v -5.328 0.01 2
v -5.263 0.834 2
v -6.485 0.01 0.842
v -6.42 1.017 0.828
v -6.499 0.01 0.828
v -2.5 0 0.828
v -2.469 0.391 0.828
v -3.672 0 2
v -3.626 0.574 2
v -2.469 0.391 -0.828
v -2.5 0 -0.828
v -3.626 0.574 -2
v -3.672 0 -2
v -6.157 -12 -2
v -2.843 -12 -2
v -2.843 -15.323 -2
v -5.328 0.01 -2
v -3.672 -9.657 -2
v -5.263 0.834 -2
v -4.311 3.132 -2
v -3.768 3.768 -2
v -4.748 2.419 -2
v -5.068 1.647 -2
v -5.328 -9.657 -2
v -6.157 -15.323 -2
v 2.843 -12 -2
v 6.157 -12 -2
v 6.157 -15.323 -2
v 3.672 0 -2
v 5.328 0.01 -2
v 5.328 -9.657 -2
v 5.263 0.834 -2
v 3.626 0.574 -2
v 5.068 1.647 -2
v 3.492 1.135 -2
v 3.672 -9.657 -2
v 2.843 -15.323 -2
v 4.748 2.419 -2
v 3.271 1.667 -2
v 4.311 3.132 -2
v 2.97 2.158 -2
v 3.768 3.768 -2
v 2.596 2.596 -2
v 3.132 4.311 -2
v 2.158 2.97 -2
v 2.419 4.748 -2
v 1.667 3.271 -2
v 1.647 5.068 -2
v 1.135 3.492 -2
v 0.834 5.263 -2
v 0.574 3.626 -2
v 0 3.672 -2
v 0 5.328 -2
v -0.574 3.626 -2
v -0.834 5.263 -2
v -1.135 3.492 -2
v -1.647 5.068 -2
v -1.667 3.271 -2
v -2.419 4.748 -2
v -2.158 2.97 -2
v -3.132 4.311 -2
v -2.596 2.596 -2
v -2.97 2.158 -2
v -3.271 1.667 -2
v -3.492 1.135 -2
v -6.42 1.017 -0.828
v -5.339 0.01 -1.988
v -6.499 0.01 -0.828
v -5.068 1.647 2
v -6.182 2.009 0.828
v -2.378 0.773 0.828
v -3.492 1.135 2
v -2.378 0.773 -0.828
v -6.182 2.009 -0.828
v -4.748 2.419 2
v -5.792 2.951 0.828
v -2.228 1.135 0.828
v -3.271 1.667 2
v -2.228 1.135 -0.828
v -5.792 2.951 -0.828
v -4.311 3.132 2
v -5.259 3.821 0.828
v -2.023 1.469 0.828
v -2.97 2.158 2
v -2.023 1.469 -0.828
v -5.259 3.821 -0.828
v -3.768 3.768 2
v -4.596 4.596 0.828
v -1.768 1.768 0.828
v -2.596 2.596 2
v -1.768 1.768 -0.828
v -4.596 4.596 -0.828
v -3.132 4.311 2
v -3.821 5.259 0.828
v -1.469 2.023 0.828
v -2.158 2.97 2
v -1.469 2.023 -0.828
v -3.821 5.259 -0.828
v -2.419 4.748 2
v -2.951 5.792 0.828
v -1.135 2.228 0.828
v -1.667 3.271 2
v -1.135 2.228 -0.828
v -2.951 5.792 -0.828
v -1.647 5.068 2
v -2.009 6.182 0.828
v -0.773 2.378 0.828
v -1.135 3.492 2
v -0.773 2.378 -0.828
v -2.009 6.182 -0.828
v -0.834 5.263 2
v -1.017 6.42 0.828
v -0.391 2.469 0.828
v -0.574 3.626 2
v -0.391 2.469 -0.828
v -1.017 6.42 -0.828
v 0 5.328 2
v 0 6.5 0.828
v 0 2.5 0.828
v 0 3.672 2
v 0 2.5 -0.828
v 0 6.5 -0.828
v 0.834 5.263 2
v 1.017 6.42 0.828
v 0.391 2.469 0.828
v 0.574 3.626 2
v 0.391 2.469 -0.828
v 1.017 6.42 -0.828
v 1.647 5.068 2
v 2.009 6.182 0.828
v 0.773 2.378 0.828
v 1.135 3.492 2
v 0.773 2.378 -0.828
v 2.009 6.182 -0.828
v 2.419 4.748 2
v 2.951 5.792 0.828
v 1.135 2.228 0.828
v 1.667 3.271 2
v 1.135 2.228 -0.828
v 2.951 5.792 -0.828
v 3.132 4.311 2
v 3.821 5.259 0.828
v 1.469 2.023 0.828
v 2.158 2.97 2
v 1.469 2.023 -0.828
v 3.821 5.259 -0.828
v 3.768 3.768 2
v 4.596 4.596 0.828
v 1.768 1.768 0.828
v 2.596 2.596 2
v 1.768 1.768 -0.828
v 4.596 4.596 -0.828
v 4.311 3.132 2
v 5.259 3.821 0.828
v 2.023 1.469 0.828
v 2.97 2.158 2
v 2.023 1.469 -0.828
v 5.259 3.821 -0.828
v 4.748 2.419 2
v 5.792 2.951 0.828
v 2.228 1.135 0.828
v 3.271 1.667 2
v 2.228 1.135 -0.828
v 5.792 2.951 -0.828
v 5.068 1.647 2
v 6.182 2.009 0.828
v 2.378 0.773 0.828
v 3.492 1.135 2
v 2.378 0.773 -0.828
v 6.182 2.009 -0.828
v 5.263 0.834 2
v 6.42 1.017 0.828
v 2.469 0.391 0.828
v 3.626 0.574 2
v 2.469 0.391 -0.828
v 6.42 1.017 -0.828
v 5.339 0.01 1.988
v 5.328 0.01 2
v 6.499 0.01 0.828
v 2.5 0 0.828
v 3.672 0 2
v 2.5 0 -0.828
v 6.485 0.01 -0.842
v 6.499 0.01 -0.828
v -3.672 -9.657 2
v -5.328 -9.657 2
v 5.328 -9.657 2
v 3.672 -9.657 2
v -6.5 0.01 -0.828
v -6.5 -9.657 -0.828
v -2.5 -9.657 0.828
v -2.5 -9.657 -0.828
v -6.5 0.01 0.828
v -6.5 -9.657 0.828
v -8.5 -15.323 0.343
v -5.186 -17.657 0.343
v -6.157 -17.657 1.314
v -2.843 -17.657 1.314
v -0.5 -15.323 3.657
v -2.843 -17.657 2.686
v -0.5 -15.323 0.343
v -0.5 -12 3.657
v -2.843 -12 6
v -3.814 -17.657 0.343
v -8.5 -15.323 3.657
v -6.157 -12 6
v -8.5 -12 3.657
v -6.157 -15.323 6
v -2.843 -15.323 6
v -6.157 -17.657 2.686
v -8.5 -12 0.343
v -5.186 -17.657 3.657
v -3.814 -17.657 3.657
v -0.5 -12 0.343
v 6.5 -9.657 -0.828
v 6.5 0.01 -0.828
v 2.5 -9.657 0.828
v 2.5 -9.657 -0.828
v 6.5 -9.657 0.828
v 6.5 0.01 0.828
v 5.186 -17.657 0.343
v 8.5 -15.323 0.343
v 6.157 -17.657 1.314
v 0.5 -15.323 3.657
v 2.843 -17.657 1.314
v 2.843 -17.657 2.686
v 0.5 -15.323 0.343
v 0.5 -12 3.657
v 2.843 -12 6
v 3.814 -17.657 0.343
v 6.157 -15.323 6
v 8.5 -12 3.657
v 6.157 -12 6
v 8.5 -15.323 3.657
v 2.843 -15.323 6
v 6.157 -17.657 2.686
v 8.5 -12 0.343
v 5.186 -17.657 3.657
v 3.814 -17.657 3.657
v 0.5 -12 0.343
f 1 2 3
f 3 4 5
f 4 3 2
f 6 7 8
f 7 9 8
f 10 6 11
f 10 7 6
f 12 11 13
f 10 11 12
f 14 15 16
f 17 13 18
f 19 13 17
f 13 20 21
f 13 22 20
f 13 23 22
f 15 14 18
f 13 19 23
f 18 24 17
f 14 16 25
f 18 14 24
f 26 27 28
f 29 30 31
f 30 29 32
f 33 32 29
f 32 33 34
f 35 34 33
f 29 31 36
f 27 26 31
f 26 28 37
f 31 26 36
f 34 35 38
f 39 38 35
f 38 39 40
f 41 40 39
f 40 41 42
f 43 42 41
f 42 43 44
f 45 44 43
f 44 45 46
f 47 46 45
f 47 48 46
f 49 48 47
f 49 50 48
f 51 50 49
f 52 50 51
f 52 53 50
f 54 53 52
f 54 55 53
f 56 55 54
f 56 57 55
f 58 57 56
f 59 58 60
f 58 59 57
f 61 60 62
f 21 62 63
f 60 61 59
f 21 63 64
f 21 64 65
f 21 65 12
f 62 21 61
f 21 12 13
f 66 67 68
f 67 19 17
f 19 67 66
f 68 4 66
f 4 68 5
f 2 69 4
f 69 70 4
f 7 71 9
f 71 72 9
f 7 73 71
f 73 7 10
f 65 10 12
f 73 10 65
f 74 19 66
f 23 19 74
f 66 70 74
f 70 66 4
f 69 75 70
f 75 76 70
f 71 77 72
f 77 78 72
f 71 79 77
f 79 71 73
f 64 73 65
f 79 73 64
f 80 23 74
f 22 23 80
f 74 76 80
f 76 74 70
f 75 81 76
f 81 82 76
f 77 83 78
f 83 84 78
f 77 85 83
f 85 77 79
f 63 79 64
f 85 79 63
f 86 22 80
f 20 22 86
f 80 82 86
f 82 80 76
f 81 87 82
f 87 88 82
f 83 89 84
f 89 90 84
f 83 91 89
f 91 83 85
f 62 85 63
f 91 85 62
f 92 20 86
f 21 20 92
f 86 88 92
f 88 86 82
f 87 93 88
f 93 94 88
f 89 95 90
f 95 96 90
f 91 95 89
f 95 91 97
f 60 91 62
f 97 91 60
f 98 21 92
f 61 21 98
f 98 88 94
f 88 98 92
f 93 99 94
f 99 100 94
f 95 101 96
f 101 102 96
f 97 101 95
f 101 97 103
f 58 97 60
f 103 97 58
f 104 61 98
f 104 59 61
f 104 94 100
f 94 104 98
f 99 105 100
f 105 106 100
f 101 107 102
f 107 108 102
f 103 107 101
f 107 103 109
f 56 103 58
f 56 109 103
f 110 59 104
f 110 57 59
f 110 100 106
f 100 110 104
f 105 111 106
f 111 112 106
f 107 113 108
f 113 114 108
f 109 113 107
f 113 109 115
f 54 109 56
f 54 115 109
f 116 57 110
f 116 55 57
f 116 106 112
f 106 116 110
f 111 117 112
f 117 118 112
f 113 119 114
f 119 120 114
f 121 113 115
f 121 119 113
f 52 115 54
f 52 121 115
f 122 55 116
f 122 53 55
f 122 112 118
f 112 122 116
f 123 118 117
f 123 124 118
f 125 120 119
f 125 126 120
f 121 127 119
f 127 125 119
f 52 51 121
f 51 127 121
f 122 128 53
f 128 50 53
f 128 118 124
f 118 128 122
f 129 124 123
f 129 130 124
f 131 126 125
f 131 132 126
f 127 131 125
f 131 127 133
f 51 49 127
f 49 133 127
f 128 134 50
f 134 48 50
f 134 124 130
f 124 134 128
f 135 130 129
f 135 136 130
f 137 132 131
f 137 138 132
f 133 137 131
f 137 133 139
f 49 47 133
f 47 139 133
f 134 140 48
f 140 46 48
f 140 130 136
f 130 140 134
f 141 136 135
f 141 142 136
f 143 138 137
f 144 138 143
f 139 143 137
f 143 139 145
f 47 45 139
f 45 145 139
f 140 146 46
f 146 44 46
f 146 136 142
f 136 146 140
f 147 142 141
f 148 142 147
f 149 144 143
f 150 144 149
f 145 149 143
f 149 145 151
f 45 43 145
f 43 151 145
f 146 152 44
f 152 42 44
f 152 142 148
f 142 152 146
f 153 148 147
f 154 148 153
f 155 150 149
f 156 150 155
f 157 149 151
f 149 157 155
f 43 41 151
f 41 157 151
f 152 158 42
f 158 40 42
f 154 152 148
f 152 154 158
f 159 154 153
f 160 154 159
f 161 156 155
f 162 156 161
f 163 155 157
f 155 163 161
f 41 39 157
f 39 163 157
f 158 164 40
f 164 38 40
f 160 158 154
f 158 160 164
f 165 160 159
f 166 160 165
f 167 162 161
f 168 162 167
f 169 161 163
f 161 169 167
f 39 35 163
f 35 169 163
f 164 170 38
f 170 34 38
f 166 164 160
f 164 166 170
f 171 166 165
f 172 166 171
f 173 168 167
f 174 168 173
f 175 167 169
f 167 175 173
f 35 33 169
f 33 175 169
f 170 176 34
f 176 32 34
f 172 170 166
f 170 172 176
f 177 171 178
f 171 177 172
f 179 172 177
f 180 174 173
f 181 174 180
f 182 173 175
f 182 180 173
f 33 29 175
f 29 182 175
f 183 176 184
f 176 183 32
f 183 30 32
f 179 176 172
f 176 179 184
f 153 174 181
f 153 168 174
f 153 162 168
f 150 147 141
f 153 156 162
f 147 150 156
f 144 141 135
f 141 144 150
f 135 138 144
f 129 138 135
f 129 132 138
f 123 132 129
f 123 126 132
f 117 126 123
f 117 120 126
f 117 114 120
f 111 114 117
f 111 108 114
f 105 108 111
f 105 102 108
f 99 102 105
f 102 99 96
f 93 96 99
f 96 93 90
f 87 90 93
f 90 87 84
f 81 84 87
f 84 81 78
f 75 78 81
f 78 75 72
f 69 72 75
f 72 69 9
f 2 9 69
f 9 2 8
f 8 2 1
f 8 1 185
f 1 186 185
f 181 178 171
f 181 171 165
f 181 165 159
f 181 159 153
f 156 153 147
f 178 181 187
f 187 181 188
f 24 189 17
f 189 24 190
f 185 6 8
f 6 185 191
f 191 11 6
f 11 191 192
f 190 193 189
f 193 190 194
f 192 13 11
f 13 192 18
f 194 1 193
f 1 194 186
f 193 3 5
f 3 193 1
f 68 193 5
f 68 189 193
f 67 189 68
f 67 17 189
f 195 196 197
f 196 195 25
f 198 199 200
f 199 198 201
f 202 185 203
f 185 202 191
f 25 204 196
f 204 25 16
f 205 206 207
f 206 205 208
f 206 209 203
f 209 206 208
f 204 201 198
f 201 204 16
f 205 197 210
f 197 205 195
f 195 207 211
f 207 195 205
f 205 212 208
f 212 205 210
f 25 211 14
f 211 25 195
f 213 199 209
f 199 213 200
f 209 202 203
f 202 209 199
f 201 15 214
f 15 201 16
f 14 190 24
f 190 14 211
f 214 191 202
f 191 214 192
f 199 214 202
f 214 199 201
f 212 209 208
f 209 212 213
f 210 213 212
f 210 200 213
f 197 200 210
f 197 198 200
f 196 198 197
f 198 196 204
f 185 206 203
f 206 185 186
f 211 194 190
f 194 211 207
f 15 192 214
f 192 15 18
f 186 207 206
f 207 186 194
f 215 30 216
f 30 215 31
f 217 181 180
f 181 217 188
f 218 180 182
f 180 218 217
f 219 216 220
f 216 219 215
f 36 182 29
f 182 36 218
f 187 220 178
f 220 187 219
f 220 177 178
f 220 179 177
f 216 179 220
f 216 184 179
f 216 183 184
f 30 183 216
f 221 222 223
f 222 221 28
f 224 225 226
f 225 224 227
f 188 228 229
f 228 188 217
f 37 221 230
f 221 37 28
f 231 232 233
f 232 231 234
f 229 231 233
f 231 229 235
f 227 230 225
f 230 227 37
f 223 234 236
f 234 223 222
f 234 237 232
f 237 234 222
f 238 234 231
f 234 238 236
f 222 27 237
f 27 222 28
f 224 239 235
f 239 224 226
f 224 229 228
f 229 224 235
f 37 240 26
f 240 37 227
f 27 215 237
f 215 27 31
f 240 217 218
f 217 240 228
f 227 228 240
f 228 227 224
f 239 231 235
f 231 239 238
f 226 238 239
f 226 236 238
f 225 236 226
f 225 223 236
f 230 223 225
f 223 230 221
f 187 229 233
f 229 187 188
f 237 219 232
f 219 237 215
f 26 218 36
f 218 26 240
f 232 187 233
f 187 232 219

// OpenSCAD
//Clip Clamp to hold two parts together without screws
//By: David Bunch   12/21/2017
//
//You could also use this clip with hole punched paper
//Adjust size with these Variables
//
/* [Main Variables] */

//1. Length of 1st Side
CL_Len1 = 12;                 //[3:1:30]

//2. Length of 2nd Side
CL_Len2 = 12;                 //[3:1:30]

//3. Gap width between Sides of Clip
CL_Gap = 5;                    //[5:1:40]

//4. Thickness of Octagon Clip
CL_Thk = 4.0;                   //[3:1:20]

//5. Thickness of Octagon Spheres at End
CL_End_Thk = 8.0;               //[6:1:30]

/* [Bend Up at Half Torus Variables] */

//6. Turn ON/OFF Semi Bend at Half Torus
CL_Semi_Bend_ON = 0;            //[0:Off, 1:ON]

//7. How much to Bend Semi Angle upwards (0-180)
CL_Semi_Ang = 90;               //[0:5:180]

//8. Radius of the Bend at Semi circle Torus
CL_Semi_Rad = 6;             //[5:1:30]

/* [Bend Out or In at End of 1st Side Variables] */

//9. Turn ON/OFF Bend at End of 1st Side
CL_End1_Bend_ON = 0;            //[0:Off, 1:ON]

//10. Length of 1st Side at end of this Bend
CL_Len3 = 3.0;                  //[3:1:20]

//11. Direction of Bend on 1st Side
CL_End1_Dir = 1;                //[0:Bend Towards Middle, 1:Bend Away from Middle]

//12. Radius of Angle of Bend on 1st & 2nd Side
CL_End1_Rad = 3.0;              //[3:1:20]

/* [Bend Out or In at End of 2nd Side Variables] */

//13. Turn ON/OFF Bend at End of 2nd Side
CL_End2_Bend_ON = 0;            //[0:Off, 1:ON]

//14. Length of Side at Start of Bend at End
CL_Len4 = 3.0;                  //[3:1:20]

//15. Direction of Bend on 2nd Side
CL_End2_Dir = 0;                //[0:Bend Towards Middle, 1:Bend Away from Middle]

/* [Bend Up at Each End Variables] */

//16. Turn ON/OFF Semi Bend at Half Torus
CL_End_BendUp_ON = 0;            //[0:Off, 1:ON]

//17. Length of Side before Bend UP
CL_Len5 = 3.0;                  //[3:1:20]

//18. How much to Bend Semi Angle upwards (0-180)
CL_End_BendUp_Ang = 45;         //[0:5:180]

//19. Radius of the Bend at Semi circle Torus
CL_End_BendUp_Rad = 12.0;       //[5:1:30]

/* [Hidden] */

CL_End2_Rad = CL_End1_Rad;
CL_End1_OD = CL_End1_Rad * 2.0;
CL_End2_OD = CL_End2_Rad * 2.0;
CL_End_BendUp_OD = CL_End_BendUp_Rad * 2.0;

CL_Semi_Y = CL_Semi_Rad * sin(CL_Semi_Ang);
CL_Semi_Z = CL_Semi_Rad - (CL_Semi_Rad * cos(CL_Semi_Ang));

CL_End_BendUp_Y = CL_End_BendUp_Rad * sin(CL_End_BendUp_Ang);
CL_End_BendUp_Z = CL_End_BendUp_Rad - (CL_End_BendUp_Rad * cos(CL_End_BendUp_Ang));

A_CL_Dir_X1 = [CL_End1_OD,-CL_End1_OD];
A_CL_Dir_X2 = [CL_End2_OD,-CL_End2_OD];
A_CL_Len = [CL_Len1,CL_Len2,CL_Len3];       //Put Lengths in Array to use in For loop
CL_Dir_X1 = A_CL_Dir_X1[CL_End1_Dir];
CL_Dir_X2 = A_CL_Dir_X2[CL_End2_Dir];

CL_End_2 = CL_End_Thk / 2.0;
CL_Oct_End_Rad = CL_End_2 / cos(22.5);
CL_Oct_End_4 = CL_End_2 * tan(22.5);
CL_Oct_End_4_Rad = CL_Oct_End_4 / cos(22.5);
CL_Oct_End_4_OD = CL_Oct_End_4_Rad * 2.0;

CL_Oct_End_OD = CL_Oct_End_Rad * 2.0;
CL_Rad = (CL_Gap + CL_Thk) / 2.0;
CL_OD = CL_Rad * 2.0;
CL_Semi_OD = CL_Semi_Rad * 2.0;
CL_Thk2 = CL_Thk / 2.0;
CL_Thk_Rad = CL_Thk2 / cos(22.5);
CL_Thk_Rad = CL_Thk2 / cos(22.5);
CL_Thk_OD = CL_Thk_Rad * 2.0;
CL_Mid_Ht = CL_Oct_End_4 * 2.0;
CL_End_Ht = (CL_End_Thk - CL_Mid_Ht) / 2.0;
CL_Z_Diff = CL_End_2 - CL_Thk2;

//Calculate resolution of curve facets
CL_OD_Res = (round(((CL_OD * 3.14)/4)/.7)*4);
CL_Semi_OD_Res = (round((((CL_Semi_OD + CL_Thk) * 3.14)/4)/.7)*4);
CL_End1_OD_Res = (round((((CL_End1_OD + CL_Thk) * 3.14)/4)/.7)*4);
CL_End_BendUp_OD_Res = (round(((CL_End_BendUp_OD * 3.14)/4)/.7)*4);

echo(CL_Semi_Y = CL_Semi_Y);
echo(CL_Semi_Z = CL_Semi_Z);
echo(CL_End_2 = CL_End_2);
echo(CL_Oct_End_Rad = CL_Oct_End_Rad);
echo(CL_Rad = CL_Rad);
echo(CL_Thk_OD = CL_Thk_OD);
echo(CL_Thk2 = CL_Thk2);
echo(CL_Thk_Rad = CL_Thk_Rad);
echo(CL_Z_Diff = CL_Z_Diff);
echo(CL_OD_Res = CL_OD_Res);
echo(CL_Oct_End_OD = CL_Oct_End_OD);
echo(CL_Oct_End_4 = CL_Oct_End_4);
echo(CL_Oct_End_4_Rad = CL_Oct_End_4_Rad);
echo(CL_Mid_Ht = CL_Mid_Ht);
echo(CL_End_Ht = CL_End_Ht);
echo(CL_Semi_OD_Res = CL_Semi_OD_Res);
echo(CL_End1_OD_Res = CL_End1_OD_Res);
module Half_Torus()
{
    difference()
    {
        rotate_extrude(angle=360, convexity=10,$fn=CL_OD_Res)
        translate([CL_Rad, 0,0]) 
        rotate([0,0,22.5])
        circle(d=CL_Thk_OD,$fn=8);
//Because thingiverse Customizer does not like partial torus objects, we cut full torus
        translate([-CL_OD,-CL_OD,-CL_Thk_OD])
        cube([CL_OD*2,CL_OD,CL_Thk_OD*2]);
    }
}
module Semi_Circ()
{
    if (CL_Semi_Bend_ON == 0)
    {
        Half_Torus();          //Draw half Torus
    } else
    {
        translate([0,CL_Semi_Y,CL_Semi_Z-.001])
        rotate([CL_Semi_Ang,0,0])
        Half_Torus();          //Draw half Torus
    }
}
//This routine cuts out a portion of a Full torus
//Because thingiverse Customizer does not like partial torus objects
module CutCube(CC_Len = CL_Semi_OD, CC_HT = CL_Thk_OD*2, CC_Ang = CL_Semi_Ang)
{
    if (CC_Ang <= 180.0)
    {
        translate([-CC_Len,-CC_Len,-1])
        cube([CC_Len*2,CC_Len,CC_HT+2]);
    } if (CC_Ang <= 270)
    {
        translate([0,-CC_Len,-1])
        cube([CC_Len,CC_Len,CC_HT+2]);
        if (CC_Ang < 270)
        {
            if (CC_Ang < 90.0)
            {
                translate([0,0,-1])
                rotate([0,0,CC_Ang])
                cube([CC_Len,CC_Len*2,CC_HT+2]);
                translate([-CC_Len,-CC_Len,-1])
                cube([CC_Len,CC_Len*2,CC_HT+2]);
            } else
            {
                rotate([0,0,CC_Ang])
                translate([0,0,-1])
                cube([CC_Len,CC_Len,CC_HT+2]);
            }
        }
    }
}
module Semi_Bend()
{
    translate([CL_Rad,0,0])
    rotate([0,90,0])
    translate([-CL_Semi_Rad,0,0])
    difference()
    {
        rotate_extrude(angle=360, convexity=10,$fn=CL_Semi_OD_Res)
        translate([CL_Semi_Rad, 0,0]) 
        rotate([0,0,22.5])
        circle(d=CL_Thk_OD,$fn=8);

        translate([0,0,-CL_Thk_OD])
        CutCube(CL_Semi_OD*2, CL_Thk_OD*2, CL_Semi_Ang);
    }
}
module End_BendUP()
{
    translate([CL_Rad,-CL_Len5,0])
    rotate([0,0,180])
    rotate([0,90,0])
    translate([-CL_End_BendUp_Rad,0,0])
    difference()
    {
        rotate_extrude(angle=360, convexity=10,$fn=CL_End_BendUp_OD_Res)
        translate([CL_End_BendUp_Rad, 0,0]) 
        rotate([0,0,22.5])
        circle(d=CL_Thk_OD,$fn=8);

        translate([0,0,-CL_Thk_OD])
        CutCube(CL_End_BendUp_Rad*4, CL_Thk_OD*2, CL_End_BendUp_Ang);
    }
}
module End_Bend()
{
    difference()
    {
        rotate_extrude(angle=360, convexity=10,$fn=CL_End1_OD_Res)
        translate([CL_End1_Rad, 0,0]) 
        rotate([0,0,22.5])
        circle(d=CL_Thk_OD,$fn=8);
        translate([-CL_End1_OD,-CL_End1_OD,-CL_Thk_OD])
        cube([CL_End1_OD*2,CL_End1_OD,CL_Thk_OD*2]);
        translate([-CL_End1_OD,-CL_End1_OD,-CL_Thk_OD])
        cube([CL_End1_OD,CL_End1_OD*2,CL_Thk_OD*2]);
    }
}
module Full_Bend()
{
    translate([-CL_End1_Rad,0,0])
    rotate([0,0,-180])
    End_Bend();
    translate([-CL_End1_Rad,-CL_End1_Rad*2,0])
    End_Bend();
    translate([-CL_End1_Rad,-CL_End1_Rad,0])
    rotate([0,90,0])
    translate([0,0,-.05])
    CylSide(CL_Thk_OD, .1);
}
//This is used because a sphere with $fn=8
//does not calculate the way an 8 sided cylinder does.
module Oct_Sphere()
{
    translate([0,0,-CL_End_Ht])
    hull()
    {
        translate([0,CL_Z_Diff,0])
        union()
        {
            translate([0,0,CL_End_Ht])
            CylSide(CL_Oct_End_OD, CL_Mid_Ht-.001);
            translate([0,0,CL_End_Ht+CL_Mid_Ht])
            rotate([0,0,22.5])
            cylinder(d1=CL_Oct_End_OD,d2=CL_Oct_End_4_OD,h=CL_End_Ht,$fn=8);
        }
        translate([0,0,0])
        rotate([0,0,22.5])
        cylinder(d=CL_Thk_OD,h=.1,$fn=8);
    }
}
module CylSide(Cy_OD = CL_Thk_OD, Cy_Len = CL_Len1)
{
    rotate([0,0,22.5])
    cylinder(d=Cy_OD,h=Cy_Len + .01,$fn=8);
}

//First Side of Clip
module Side1()
{
    translate([-CL_Rad, 0,0])
    rotate([90,0,0])
    {
        translate([0,0,-.01])
        CylSide(CL_Thk_OD, CL_Len1+.01);
        if (CL_End1_Bend_ON == 0)
        {
            translate([0,0,CL_Len1])
            Oct_Sphere();
        } else
        {
            translate([CL_Dir_X1,0,CL_Len1])
            mirror([CL_End1_Dir,0,0])
            rotate([-90,0,0])
            Full_Bend();
            translate([CL_Dir_X1 ,0,CL_Len1 + CL_End1_OD])
            translate([0,0,-.01])
            CylSide(CL_Thk_OD, CL_Len3);
            translate([CL_Dir_X1,0,CL_Len1 + CL_End1_OD + CL_Len3])
            Oct_Sphere();
        }
    }
}
//Second Side of Clip
module Side2()
{
    mirror([1,0,0])
    translate([-CL_Rad, 0,0])
    rotate([90,0,0])
    {
        translate([0,0,-.01])
        CylSide(CL_Thk_OD, CL_Len2+.01);
        if (CL_End2_Bend_ON == 0)
        {
            translate([0,0,CL_Len2])
            Oct_Sphere();
        } else
        {
            translate([CL_Dir_X2,0,CL_Len2])
            mirror([CL_End2_Dir,0,0])
            rotate([-90,0,0])
            Full_Bend();
            translate([CL_Dir_X2 ,0,CL_Len2 + CL_End1_OD])
            translate([0,0,-.01])
            CylSide(CL_Thk_OD, CL_Len4);
            translate([CL_Dir_X2,0,CL_Len2 + CL_End1_OD + CL_Len4])
            Oct_Sphere();
        }
    }
}
module DrawFinal()
{
    union()
    {
        Semi_Circ();
        if (CL_End_BendUp_ON == 0)
        {
            Side1();
            Side2();
        } else
        {
            End_BendUP();        //The Bend up at 1st End
            translate([-CL_Rad, 0,0])
            rotate([90,0,0])
            CylSide(CL_Thk_OD, CL_Len5);    //Len5 is 1st length with End_BendUP option
    
            mirror([1,0,0])
            End_BendUP();        //The Bend up at 2nd End
            translate([CL_Rad, 0,0])
            rotate([90,0,0])
            CylSide(CL_Thk_OD, CL_Len5);    //Len5 is 1st length with End_BendUP option
    
            translate([0,-CL_Len5 - CL_End_BendUp_Y,CL_End_BendUp_Z])
            rotate([-CL_End_BendUp_Ang,0,0])
            {
                Side1();
                Side2();
            }
        }
        for (m = [0,1])
        {
            if (CL_Semi_Bend_ON == 1)
            {
                mirror([m,0,0])
                Semi_Bend();        //The Bend up at the semi torus
            }
        }
    }
}
DrawFinal();
